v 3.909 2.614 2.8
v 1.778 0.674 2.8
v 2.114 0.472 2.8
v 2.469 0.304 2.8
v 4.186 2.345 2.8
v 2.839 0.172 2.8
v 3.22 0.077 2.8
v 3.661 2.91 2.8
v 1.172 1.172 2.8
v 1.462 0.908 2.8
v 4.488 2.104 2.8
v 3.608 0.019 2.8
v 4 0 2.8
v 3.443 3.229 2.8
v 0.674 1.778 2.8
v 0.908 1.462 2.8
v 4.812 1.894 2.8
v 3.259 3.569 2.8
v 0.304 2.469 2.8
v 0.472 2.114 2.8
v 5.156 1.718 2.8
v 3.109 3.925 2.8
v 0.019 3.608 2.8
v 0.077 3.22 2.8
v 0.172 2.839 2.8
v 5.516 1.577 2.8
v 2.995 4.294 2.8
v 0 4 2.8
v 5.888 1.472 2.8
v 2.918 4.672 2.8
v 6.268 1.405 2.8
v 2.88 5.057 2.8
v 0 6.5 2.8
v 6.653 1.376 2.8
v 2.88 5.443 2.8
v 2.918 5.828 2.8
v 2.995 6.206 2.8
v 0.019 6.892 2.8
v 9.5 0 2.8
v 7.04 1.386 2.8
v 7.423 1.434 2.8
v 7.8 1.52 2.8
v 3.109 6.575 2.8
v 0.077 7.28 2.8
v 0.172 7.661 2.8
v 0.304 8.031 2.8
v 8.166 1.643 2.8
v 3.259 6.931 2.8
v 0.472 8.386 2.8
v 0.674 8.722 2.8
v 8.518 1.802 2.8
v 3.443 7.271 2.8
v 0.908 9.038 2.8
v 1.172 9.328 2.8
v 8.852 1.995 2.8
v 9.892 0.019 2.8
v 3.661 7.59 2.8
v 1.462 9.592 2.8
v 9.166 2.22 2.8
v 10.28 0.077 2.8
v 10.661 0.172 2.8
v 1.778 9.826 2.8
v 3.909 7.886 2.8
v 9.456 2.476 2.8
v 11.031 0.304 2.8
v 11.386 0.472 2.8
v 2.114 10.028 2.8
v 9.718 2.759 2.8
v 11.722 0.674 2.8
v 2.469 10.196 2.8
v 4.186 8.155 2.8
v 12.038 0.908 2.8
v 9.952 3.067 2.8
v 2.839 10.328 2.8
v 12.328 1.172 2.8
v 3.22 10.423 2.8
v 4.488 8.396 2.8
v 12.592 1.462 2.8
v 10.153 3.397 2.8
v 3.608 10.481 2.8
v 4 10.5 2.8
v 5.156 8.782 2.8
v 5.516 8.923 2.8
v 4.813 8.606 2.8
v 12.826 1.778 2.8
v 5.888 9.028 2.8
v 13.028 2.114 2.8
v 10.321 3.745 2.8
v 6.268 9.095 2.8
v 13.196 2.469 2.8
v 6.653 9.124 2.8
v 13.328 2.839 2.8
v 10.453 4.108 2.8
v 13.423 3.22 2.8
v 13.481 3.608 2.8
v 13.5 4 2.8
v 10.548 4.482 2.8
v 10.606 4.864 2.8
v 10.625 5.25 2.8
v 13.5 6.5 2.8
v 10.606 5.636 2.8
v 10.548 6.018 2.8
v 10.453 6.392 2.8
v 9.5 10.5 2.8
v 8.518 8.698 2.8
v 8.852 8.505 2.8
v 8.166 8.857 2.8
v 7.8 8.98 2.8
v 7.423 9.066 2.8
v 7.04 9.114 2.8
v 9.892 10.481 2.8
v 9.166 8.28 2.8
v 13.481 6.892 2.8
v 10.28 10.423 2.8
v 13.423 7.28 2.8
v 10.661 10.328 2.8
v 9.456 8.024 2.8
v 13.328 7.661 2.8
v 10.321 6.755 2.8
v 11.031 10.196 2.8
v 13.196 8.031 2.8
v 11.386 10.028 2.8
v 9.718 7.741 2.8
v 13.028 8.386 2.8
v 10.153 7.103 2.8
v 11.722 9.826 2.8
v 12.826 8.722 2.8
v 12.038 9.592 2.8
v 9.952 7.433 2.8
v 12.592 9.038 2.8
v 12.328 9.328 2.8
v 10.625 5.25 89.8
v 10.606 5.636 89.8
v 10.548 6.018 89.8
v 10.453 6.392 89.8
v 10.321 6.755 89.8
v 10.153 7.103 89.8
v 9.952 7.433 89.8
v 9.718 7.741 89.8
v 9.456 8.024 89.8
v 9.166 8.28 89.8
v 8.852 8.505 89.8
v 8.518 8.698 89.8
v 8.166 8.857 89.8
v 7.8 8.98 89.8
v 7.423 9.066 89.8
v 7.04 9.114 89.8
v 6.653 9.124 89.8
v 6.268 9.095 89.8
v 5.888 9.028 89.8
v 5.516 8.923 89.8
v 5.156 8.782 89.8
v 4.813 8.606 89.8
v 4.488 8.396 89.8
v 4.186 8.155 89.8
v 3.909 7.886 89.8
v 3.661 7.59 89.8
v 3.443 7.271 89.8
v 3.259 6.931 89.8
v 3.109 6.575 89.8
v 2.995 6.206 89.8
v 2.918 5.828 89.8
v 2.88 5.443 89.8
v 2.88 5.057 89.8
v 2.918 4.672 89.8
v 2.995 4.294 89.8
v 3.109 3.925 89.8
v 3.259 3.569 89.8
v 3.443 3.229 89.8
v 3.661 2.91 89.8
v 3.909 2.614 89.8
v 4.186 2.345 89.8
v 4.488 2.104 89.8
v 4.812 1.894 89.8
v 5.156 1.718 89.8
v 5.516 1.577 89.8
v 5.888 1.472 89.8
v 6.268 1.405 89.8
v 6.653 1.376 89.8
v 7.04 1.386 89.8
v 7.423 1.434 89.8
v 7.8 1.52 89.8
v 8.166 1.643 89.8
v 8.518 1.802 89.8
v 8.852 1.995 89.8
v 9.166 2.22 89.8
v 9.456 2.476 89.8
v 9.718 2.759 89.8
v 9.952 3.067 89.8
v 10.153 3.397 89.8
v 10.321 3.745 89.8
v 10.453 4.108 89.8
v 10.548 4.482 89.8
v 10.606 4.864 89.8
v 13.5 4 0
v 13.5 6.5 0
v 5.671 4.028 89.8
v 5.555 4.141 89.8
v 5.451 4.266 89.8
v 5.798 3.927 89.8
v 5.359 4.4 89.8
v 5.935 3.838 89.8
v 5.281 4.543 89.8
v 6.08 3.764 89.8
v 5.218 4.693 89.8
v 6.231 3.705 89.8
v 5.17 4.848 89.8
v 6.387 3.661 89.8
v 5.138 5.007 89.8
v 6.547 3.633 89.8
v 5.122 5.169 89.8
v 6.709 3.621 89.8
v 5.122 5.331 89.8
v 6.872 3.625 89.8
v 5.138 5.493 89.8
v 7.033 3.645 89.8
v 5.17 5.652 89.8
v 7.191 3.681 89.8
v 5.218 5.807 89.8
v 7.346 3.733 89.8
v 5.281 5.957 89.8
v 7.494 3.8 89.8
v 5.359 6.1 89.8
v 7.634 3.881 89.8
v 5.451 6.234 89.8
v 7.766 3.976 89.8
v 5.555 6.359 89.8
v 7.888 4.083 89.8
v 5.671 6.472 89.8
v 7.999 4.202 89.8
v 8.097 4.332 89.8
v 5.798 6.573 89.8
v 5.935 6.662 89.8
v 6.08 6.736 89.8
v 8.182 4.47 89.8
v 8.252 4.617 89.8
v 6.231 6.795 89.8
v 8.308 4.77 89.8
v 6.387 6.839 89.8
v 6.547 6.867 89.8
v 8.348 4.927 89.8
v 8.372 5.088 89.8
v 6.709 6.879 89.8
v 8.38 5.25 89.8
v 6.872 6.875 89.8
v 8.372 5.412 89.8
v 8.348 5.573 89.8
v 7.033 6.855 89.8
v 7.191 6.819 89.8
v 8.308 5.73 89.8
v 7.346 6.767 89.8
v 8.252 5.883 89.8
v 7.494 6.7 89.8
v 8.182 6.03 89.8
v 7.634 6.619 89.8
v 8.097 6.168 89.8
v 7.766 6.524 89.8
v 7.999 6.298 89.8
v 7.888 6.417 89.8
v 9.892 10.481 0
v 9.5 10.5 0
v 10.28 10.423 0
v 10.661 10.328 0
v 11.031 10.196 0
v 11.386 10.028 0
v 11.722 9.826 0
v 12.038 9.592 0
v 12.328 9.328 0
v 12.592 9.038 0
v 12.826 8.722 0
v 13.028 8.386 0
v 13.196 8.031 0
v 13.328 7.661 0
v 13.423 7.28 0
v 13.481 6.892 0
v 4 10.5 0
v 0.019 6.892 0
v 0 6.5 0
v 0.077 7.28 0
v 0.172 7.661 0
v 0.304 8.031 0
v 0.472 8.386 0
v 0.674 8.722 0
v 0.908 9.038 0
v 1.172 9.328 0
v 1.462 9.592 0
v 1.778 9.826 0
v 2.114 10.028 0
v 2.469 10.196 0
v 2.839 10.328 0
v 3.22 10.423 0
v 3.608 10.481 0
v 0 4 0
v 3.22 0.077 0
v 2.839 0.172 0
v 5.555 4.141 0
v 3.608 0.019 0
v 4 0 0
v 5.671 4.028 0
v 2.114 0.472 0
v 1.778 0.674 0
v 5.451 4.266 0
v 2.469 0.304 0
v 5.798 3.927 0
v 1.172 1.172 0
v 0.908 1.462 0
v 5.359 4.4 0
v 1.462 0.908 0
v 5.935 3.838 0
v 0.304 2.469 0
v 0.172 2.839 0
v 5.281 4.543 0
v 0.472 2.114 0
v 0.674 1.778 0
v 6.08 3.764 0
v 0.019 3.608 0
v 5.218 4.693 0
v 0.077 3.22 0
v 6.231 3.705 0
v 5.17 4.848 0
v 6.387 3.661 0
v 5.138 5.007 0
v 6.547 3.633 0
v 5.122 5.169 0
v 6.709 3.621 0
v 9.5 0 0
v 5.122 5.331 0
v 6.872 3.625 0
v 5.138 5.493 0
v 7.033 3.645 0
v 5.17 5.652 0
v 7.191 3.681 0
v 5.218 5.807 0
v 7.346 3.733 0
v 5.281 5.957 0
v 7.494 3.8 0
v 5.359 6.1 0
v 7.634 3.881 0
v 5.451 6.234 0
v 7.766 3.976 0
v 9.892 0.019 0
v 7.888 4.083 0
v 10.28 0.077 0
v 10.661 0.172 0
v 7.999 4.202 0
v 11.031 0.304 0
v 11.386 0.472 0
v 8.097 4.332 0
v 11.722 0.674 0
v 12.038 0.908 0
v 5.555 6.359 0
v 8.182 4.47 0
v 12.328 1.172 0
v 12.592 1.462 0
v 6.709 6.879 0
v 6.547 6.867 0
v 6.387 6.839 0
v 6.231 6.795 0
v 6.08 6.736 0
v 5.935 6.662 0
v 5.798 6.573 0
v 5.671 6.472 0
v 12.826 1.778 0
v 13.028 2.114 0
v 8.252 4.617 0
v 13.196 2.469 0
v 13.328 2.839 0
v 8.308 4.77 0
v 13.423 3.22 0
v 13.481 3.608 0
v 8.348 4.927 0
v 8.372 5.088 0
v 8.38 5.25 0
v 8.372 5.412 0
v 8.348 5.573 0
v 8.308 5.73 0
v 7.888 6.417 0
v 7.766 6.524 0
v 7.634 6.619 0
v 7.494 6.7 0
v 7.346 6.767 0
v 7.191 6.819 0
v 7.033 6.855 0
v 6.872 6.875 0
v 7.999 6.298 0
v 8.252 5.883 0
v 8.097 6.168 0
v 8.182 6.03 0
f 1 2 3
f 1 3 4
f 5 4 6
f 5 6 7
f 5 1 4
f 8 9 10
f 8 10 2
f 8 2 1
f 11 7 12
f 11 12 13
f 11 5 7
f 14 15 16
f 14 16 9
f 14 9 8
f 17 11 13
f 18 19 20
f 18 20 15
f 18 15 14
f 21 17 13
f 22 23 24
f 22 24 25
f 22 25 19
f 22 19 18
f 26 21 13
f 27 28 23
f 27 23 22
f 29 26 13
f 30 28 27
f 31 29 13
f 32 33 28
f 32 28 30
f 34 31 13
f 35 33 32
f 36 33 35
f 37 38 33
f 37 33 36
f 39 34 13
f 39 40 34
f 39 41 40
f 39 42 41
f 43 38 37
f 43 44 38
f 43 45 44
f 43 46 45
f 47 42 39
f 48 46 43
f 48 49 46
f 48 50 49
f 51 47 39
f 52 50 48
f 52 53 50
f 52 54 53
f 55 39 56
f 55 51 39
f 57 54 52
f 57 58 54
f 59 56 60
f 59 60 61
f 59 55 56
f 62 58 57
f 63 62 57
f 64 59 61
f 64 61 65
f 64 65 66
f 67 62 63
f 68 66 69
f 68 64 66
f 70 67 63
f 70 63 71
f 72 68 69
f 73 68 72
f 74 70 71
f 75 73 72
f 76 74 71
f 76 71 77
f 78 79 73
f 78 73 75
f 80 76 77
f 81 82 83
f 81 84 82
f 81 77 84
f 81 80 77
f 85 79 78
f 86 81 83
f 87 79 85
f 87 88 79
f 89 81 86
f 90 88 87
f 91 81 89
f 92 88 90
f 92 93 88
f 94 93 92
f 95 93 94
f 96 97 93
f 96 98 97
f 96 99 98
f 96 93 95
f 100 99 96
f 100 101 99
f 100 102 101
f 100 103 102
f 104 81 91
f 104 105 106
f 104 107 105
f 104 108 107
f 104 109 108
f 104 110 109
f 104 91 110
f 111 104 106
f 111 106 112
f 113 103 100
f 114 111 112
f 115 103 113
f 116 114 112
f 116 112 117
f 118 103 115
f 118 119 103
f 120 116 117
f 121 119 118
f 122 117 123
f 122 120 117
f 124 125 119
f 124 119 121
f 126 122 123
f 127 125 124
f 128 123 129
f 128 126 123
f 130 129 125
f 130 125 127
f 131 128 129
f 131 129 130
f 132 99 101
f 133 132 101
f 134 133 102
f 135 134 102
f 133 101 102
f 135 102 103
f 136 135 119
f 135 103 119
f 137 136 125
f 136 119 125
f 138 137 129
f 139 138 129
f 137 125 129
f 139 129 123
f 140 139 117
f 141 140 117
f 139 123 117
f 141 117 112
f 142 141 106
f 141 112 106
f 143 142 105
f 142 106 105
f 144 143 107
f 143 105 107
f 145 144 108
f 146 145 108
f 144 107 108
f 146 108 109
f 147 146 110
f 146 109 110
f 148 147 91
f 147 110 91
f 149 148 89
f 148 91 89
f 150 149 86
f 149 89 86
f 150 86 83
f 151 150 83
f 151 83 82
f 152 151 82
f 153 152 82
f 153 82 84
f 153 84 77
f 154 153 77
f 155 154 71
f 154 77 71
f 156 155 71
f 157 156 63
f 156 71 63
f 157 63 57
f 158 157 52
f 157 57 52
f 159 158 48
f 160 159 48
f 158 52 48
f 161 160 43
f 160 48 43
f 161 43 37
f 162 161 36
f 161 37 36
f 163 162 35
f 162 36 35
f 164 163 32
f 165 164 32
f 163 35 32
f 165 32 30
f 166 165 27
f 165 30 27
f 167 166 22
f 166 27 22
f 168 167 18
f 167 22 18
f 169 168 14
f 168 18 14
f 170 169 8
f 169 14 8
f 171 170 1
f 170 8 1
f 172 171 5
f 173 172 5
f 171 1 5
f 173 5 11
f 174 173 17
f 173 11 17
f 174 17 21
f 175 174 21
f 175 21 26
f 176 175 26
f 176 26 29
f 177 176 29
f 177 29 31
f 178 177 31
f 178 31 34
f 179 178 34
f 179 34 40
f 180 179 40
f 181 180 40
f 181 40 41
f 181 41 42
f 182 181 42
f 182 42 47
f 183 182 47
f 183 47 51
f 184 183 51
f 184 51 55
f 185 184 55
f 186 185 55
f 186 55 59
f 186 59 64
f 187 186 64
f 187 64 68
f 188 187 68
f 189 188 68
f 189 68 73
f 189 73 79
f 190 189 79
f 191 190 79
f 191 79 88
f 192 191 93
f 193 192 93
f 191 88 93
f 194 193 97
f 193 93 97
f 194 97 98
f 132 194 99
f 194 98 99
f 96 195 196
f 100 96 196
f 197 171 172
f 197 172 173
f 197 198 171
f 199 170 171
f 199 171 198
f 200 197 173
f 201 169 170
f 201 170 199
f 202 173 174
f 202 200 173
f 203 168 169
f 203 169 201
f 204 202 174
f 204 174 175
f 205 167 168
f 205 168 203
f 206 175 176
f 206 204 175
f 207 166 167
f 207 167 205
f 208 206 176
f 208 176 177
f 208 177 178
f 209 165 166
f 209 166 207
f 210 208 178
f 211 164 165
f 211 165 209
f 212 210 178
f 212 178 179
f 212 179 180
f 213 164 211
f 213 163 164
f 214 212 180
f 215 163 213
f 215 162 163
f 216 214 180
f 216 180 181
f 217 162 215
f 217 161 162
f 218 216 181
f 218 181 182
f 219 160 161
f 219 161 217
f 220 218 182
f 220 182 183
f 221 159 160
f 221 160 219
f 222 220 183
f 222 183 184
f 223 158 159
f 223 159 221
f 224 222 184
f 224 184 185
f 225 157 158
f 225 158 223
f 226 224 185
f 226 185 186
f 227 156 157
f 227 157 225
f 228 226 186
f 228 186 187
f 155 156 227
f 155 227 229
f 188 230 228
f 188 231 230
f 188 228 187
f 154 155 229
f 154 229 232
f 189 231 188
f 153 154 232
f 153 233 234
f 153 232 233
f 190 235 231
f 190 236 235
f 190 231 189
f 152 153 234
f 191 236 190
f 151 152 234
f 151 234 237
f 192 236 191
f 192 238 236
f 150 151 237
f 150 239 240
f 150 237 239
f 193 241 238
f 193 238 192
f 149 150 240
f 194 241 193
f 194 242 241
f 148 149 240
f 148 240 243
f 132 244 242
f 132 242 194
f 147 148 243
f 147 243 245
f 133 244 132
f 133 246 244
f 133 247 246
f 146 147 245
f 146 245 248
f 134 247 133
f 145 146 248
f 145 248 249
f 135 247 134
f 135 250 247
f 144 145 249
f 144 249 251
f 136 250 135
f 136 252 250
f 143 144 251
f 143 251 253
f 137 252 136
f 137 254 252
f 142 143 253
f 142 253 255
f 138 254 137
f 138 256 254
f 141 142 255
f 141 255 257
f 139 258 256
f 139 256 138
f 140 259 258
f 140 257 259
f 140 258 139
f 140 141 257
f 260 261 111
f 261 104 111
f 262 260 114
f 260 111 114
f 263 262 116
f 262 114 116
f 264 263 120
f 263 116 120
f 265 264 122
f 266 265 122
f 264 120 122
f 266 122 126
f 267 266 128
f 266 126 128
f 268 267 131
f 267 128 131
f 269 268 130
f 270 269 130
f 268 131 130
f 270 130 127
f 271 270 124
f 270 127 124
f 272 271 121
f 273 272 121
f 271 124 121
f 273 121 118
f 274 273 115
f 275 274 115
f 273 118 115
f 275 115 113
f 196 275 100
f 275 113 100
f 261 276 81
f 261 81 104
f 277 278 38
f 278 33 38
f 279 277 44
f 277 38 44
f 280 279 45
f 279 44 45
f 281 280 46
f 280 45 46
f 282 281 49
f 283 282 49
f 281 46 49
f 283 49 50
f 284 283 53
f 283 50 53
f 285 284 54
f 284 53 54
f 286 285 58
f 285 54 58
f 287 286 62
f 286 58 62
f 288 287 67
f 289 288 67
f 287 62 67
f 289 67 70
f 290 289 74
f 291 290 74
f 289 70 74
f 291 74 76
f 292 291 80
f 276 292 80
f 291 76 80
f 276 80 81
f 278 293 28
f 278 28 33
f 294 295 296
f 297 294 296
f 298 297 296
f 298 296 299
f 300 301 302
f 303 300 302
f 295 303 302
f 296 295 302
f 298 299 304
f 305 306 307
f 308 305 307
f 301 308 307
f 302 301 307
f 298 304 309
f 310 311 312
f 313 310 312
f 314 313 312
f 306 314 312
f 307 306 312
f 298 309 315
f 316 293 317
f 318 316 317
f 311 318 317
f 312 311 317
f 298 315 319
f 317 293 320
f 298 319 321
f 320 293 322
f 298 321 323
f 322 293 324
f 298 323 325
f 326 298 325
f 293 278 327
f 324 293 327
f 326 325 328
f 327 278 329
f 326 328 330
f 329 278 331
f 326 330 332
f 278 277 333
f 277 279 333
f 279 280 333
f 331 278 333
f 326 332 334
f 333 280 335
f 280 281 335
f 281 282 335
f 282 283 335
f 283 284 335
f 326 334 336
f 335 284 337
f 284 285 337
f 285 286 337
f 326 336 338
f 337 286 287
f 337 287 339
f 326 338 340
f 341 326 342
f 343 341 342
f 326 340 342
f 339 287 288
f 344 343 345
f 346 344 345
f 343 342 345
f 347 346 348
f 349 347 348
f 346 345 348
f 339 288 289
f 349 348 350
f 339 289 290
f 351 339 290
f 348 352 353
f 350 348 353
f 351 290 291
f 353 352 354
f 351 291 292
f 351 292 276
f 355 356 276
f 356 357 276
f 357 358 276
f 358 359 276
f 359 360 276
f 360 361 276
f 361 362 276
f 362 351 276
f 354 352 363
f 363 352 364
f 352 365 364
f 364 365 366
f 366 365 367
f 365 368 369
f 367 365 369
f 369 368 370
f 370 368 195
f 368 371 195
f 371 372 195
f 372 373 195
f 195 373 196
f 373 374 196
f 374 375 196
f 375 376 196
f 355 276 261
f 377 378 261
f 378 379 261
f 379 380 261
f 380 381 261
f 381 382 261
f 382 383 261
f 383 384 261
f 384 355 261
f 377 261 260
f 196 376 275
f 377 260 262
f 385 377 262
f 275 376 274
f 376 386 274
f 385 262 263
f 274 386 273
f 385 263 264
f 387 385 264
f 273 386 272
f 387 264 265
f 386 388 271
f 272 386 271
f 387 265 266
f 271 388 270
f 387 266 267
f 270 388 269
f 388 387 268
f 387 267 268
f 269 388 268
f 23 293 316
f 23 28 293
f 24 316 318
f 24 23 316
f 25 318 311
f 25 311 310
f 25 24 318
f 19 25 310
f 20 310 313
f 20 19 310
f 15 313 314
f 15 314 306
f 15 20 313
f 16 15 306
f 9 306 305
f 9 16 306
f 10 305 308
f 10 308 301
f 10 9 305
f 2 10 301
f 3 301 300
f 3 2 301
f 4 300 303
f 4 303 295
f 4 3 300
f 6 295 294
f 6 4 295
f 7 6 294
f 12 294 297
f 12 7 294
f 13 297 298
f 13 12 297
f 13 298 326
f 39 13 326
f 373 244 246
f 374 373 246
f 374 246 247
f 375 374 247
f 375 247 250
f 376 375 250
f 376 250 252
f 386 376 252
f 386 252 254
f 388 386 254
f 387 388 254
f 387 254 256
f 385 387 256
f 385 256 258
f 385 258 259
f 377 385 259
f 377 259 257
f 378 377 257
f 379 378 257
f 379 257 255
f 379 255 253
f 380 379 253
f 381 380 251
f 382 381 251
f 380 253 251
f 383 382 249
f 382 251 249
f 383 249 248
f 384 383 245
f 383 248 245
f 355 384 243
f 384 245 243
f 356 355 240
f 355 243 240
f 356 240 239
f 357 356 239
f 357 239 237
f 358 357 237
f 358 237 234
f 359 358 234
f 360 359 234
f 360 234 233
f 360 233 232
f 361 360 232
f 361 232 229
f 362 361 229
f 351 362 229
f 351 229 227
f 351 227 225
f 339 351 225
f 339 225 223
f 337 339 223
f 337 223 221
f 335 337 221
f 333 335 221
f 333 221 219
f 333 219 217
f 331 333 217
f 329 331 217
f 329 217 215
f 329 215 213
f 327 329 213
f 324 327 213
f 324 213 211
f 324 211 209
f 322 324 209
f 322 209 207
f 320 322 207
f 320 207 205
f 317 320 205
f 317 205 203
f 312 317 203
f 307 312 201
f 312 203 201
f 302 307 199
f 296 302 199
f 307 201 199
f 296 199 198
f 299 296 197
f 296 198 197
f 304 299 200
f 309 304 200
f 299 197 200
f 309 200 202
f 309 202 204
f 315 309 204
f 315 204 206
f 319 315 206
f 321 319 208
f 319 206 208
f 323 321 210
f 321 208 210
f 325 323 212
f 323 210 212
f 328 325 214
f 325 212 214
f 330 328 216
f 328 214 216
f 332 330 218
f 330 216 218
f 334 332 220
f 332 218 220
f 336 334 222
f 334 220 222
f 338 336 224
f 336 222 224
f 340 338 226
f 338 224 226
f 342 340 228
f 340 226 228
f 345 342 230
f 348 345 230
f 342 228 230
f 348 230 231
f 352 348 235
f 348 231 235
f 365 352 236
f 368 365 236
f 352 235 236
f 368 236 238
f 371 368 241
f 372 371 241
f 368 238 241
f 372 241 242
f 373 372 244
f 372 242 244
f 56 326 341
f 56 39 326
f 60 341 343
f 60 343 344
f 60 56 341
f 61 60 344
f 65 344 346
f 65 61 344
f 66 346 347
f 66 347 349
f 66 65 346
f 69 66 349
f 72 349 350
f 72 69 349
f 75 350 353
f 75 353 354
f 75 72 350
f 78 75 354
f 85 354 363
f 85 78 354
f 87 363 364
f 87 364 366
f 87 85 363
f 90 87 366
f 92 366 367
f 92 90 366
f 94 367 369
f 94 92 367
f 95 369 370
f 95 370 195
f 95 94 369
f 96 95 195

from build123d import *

# Parameters (mm, degrees)
SKETCH4_W           = 13.5
SKETCH4_H           = 10.5
BOSS_EXTRUDE2_DEPTH = 2.8
SKETCH5_R           = 3.875
BOSS_EXTRUDE3_DEPTH = 87
SKETCH6_R           = 1.63
CUT_EXTRUDE1_DEPTH  = 90.8
FILLET1_R           = 4


with BuildPart() as part:
    # Sketch4 → Boss-Extrude2 (new body)
    with BuildSketch(Plane.XY):
        with Locations((6.75, 5.25)):
            Rectangle(SKETCH4_W, SKETCH4_H)
    extrude(amount=BOSS_EXTRUDE2_DEPTH)

    # Sketch5 → Boss-Extrude3 (add)
    with BuildSketch(Plane.XY.offset(2.8)):
        with Locations((6.75, 5.25)):
            Circle(SKETCH5_R)
    extrude(amount=BOSS_EXTRUDE3_DEPTH)

    # Sketch6 → Cut-Extrude1 (cut, through all)
    with BuildSketch(Plane.XY.offset(89.8)):
        with Locations((6.75, 5.25)):
            Circle(SKETCH6_R)
    extrude(amount=-CUT_EXTRUDE1_DEPTH, mode=Mode.SUBTRACT)

    # Fillet1
    fillet1_edges = [part.edges().sort_by_distance(p)[0] for p in [
        (0, 10.5, 1.4),
        (13.5, 10.5, 1.4),
        (13.5, 0, 1.4),
        (0, 0, 1.4),
    ]]
    fillet(fillet1_edges, radius=FILLET1_R)


solid = part.part
